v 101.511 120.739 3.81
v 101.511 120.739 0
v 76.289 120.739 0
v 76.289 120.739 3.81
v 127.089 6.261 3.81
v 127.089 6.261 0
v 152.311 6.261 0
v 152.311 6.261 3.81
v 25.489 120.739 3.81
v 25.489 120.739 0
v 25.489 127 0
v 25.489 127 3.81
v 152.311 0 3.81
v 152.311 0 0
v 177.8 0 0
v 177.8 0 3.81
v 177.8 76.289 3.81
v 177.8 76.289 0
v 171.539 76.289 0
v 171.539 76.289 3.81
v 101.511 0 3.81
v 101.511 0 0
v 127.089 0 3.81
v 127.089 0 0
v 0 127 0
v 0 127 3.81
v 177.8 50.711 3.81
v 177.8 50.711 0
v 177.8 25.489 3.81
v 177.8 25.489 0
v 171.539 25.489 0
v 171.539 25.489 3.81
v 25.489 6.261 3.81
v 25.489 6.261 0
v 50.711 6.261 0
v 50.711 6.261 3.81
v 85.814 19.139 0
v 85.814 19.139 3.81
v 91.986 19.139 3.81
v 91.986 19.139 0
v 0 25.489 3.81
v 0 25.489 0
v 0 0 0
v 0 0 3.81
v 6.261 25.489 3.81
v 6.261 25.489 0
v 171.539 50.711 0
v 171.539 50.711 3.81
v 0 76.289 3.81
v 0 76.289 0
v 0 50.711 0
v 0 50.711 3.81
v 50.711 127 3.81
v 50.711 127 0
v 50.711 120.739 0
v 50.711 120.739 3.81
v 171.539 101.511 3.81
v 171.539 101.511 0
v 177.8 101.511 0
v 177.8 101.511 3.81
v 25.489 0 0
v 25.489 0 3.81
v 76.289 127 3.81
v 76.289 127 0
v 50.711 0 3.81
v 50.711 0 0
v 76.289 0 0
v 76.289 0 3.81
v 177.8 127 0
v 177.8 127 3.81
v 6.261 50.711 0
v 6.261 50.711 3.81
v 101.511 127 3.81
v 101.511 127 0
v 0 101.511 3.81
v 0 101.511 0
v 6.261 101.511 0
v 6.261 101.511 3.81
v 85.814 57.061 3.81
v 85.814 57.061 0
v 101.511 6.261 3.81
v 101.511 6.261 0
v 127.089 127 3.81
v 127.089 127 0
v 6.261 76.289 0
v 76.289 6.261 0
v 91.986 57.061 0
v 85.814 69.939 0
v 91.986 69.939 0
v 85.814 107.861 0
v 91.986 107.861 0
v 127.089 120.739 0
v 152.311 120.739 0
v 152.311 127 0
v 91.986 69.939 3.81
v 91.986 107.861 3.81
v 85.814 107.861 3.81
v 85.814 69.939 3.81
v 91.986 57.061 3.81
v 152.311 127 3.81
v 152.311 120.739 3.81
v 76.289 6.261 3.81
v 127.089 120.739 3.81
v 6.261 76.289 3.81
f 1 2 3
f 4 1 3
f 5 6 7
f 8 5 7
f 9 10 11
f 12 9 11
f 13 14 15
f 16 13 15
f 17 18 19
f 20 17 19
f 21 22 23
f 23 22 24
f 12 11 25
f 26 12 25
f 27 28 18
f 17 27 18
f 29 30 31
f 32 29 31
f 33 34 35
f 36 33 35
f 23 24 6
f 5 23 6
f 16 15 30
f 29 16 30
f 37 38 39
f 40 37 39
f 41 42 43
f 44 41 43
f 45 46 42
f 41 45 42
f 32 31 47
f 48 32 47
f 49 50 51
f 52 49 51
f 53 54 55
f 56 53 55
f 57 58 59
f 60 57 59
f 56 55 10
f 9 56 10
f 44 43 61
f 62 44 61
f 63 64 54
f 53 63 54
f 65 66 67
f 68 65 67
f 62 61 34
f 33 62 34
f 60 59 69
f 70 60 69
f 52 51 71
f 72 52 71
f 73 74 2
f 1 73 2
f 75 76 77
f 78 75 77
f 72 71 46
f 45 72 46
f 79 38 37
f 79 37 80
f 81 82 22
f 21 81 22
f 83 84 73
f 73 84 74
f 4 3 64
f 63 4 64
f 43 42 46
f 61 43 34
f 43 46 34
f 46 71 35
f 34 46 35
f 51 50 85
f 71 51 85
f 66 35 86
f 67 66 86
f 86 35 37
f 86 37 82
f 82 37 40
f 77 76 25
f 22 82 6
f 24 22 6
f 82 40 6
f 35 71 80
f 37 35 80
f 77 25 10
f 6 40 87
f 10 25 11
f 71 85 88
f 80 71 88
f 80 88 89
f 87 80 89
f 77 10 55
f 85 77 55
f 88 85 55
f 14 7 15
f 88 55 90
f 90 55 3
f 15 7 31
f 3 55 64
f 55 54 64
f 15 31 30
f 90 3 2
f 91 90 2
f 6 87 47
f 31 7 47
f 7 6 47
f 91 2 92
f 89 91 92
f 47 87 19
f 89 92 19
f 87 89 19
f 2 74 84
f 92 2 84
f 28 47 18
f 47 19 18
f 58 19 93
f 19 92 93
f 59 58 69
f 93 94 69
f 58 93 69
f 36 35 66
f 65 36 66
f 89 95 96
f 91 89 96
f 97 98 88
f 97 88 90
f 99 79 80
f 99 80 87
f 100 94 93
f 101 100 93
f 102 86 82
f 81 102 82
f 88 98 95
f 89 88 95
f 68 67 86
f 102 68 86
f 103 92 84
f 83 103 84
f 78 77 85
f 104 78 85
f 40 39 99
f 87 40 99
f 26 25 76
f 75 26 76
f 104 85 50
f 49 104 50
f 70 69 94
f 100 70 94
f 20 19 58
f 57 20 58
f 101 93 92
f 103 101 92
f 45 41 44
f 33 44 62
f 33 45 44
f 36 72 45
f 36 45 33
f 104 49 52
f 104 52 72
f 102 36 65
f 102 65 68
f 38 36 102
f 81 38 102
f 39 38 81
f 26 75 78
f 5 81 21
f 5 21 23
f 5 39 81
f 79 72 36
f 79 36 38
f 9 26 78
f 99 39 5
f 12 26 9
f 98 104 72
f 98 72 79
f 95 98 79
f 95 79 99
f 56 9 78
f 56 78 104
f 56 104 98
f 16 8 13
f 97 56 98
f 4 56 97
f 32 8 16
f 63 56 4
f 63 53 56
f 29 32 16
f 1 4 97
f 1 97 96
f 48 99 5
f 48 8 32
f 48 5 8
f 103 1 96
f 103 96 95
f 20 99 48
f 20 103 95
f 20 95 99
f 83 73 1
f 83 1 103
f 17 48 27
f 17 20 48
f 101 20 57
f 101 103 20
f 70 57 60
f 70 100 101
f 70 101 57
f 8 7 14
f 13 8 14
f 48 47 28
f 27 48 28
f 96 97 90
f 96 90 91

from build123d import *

# Parameters (mm, degrees)
F1_DEPTH = 3.81
F2_W     = 6.1722
F2_H     = 37.9222
F3_DEPTH = 3.811


with BuildPart() as f1:
    # F0 (on Top) → F1 (new body)
    with BuildSketch(Plane.XY):
        Polygon((25.4889, 127), (0, 127), (0, 101.5111), (6.2611, 101.5111), (6.2611, 76.2889), (0, 76.2889), (0, 50.7111), (6.2611, 50.7111), (6.2611, 25.4889), (0, 25.4889), (0, 0), (25.4889, 0), (25.4889, 6.2611), (50.7111, 6.2611), (50.7111, 0), (76.2889, 0), (76.2889, 6.2611), (101.5111, 6.2611), (101.5111, 0), (127.0889, 0), (127.0889, 6.2611), (152.3111, 6.2611), (152.3111, 0), (177.8, 0), (177.8, 25.4889), (171.5389, 25.4889), (171.5389, 50.7111), (177.8, 50.7111), (177.8, 76.2889), (171.5389, 76.2889), (171.5389, 101.5111), (177.8, 101.5111), (177.8, 127), (152.3111, 127), (152.3111, 120.7389), (127.0889, 120.7389), (127.0889, 127), (101.5111, 127), (101.5111, 120.7389), (76.2889, 120.7389), (76.2889, 127), (50.7111, 127), (50.7111, 120.7389), (25.4889, 120.7389), align=None)
    extrude(amount=F1_DEPTH)

    # F2 (on face) → F3 (cut, through all)
    with BuildSketch(Plane.XY.offset(3.81)):
        with Locations((88.9, 88.9)):
            Rectangle(F2_W, F2_H)
        with Locations((88.9, 38.1)):
            Rectangle(F2_W, F2_H)
    extrude(amount=-F3_DEPTH, mode=Mode.SUBTRACT)


solid = f1.part
